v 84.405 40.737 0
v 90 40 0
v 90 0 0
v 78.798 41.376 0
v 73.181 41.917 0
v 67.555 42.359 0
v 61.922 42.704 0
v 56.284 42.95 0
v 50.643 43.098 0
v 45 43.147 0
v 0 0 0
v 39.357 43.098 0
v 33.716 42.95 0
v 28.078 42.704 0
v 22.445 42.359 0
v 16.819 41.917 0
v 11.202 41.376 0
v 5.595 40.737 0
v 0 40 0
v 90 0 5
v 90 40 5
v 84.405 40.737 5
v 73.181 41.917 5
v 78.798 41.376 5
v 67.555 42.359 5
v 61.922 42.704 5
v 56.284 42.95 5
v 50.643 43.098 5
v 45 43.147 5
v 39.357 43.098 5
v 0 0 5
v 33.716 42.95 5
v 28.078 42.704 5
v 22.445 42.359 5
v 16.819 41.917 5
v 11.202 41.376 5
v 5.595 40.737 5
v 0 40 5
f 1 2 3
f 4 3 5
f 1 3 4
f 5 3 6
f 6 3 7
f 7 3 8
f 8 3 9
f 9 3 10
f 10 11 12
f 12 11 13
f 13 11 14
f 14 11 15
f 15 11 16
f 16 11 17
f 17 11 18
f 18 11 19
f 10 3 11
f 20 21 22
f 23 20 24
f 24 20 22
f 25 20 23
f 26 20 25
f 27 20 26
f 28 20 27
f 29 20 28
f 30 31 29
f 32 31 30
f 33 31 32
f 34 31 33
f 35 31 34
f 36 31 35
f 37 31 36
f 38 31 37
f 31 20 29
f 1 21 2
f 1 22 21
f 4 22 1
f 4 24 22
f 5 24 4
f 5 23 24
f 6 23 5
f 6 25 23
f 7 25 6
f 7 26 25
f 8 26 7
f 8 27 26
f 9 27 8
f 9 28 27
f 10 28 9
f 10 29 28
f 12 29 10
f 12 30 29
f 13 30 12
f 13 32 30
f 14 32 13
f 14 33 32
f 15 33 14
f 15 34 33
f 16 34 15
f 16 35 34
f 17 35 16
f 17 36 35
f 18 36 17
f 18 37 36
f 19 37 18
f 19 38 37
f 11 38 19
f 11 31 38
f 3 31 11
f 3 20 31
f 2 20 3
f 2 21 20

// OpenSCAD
$fn = 32;

// ----------------------------------------------------------------------
// Arc profile plate: crown, 19 points
// ----------------------------------------------------------------------

// --- parameters (mm) ---
bar_l = 90;               // bar length, X
bar_w = 40;               // bar height at the ends, Y
arc_r = 323.34;           // radius of the crown arc
arc_angle = 16;           // crown arc angle, degrees
crown_rise = 3.15;        // rise of the crown over the ends
arc_step = 1;             // sampling step of the crown arc, degrees
plate_t = 5;              // plate thickness, Z
fit_tol = 0.02;           // declared fit tolerance (prompt contract)
free_tol = 0.2;           // declared free tolerance (prompt contract)

bbox_y = bar_w + crown_rise;  // full height with the crown

profile = [[90, 40], [84.405, 40.737], [78.798, 41.376], [73.181, 41.917], [67.555, 42.359], [61.922, 42.704], [56.284, 42.95], [50.643, 43.098], [45, 43.147], [39.357, 43.098], [33.716, 42.95], [28.078, 42.704], [22.445, 42.359], [16.819, 41.917], [11.202, 41.376], [5.595, 40.737], [0, 40], [0, 0], [90, 0]];  // primary outline, 19 points, counter clockwise

// --- the one profile operation ---
linear_extrude(height = plate_t) polygon(points = profile);
